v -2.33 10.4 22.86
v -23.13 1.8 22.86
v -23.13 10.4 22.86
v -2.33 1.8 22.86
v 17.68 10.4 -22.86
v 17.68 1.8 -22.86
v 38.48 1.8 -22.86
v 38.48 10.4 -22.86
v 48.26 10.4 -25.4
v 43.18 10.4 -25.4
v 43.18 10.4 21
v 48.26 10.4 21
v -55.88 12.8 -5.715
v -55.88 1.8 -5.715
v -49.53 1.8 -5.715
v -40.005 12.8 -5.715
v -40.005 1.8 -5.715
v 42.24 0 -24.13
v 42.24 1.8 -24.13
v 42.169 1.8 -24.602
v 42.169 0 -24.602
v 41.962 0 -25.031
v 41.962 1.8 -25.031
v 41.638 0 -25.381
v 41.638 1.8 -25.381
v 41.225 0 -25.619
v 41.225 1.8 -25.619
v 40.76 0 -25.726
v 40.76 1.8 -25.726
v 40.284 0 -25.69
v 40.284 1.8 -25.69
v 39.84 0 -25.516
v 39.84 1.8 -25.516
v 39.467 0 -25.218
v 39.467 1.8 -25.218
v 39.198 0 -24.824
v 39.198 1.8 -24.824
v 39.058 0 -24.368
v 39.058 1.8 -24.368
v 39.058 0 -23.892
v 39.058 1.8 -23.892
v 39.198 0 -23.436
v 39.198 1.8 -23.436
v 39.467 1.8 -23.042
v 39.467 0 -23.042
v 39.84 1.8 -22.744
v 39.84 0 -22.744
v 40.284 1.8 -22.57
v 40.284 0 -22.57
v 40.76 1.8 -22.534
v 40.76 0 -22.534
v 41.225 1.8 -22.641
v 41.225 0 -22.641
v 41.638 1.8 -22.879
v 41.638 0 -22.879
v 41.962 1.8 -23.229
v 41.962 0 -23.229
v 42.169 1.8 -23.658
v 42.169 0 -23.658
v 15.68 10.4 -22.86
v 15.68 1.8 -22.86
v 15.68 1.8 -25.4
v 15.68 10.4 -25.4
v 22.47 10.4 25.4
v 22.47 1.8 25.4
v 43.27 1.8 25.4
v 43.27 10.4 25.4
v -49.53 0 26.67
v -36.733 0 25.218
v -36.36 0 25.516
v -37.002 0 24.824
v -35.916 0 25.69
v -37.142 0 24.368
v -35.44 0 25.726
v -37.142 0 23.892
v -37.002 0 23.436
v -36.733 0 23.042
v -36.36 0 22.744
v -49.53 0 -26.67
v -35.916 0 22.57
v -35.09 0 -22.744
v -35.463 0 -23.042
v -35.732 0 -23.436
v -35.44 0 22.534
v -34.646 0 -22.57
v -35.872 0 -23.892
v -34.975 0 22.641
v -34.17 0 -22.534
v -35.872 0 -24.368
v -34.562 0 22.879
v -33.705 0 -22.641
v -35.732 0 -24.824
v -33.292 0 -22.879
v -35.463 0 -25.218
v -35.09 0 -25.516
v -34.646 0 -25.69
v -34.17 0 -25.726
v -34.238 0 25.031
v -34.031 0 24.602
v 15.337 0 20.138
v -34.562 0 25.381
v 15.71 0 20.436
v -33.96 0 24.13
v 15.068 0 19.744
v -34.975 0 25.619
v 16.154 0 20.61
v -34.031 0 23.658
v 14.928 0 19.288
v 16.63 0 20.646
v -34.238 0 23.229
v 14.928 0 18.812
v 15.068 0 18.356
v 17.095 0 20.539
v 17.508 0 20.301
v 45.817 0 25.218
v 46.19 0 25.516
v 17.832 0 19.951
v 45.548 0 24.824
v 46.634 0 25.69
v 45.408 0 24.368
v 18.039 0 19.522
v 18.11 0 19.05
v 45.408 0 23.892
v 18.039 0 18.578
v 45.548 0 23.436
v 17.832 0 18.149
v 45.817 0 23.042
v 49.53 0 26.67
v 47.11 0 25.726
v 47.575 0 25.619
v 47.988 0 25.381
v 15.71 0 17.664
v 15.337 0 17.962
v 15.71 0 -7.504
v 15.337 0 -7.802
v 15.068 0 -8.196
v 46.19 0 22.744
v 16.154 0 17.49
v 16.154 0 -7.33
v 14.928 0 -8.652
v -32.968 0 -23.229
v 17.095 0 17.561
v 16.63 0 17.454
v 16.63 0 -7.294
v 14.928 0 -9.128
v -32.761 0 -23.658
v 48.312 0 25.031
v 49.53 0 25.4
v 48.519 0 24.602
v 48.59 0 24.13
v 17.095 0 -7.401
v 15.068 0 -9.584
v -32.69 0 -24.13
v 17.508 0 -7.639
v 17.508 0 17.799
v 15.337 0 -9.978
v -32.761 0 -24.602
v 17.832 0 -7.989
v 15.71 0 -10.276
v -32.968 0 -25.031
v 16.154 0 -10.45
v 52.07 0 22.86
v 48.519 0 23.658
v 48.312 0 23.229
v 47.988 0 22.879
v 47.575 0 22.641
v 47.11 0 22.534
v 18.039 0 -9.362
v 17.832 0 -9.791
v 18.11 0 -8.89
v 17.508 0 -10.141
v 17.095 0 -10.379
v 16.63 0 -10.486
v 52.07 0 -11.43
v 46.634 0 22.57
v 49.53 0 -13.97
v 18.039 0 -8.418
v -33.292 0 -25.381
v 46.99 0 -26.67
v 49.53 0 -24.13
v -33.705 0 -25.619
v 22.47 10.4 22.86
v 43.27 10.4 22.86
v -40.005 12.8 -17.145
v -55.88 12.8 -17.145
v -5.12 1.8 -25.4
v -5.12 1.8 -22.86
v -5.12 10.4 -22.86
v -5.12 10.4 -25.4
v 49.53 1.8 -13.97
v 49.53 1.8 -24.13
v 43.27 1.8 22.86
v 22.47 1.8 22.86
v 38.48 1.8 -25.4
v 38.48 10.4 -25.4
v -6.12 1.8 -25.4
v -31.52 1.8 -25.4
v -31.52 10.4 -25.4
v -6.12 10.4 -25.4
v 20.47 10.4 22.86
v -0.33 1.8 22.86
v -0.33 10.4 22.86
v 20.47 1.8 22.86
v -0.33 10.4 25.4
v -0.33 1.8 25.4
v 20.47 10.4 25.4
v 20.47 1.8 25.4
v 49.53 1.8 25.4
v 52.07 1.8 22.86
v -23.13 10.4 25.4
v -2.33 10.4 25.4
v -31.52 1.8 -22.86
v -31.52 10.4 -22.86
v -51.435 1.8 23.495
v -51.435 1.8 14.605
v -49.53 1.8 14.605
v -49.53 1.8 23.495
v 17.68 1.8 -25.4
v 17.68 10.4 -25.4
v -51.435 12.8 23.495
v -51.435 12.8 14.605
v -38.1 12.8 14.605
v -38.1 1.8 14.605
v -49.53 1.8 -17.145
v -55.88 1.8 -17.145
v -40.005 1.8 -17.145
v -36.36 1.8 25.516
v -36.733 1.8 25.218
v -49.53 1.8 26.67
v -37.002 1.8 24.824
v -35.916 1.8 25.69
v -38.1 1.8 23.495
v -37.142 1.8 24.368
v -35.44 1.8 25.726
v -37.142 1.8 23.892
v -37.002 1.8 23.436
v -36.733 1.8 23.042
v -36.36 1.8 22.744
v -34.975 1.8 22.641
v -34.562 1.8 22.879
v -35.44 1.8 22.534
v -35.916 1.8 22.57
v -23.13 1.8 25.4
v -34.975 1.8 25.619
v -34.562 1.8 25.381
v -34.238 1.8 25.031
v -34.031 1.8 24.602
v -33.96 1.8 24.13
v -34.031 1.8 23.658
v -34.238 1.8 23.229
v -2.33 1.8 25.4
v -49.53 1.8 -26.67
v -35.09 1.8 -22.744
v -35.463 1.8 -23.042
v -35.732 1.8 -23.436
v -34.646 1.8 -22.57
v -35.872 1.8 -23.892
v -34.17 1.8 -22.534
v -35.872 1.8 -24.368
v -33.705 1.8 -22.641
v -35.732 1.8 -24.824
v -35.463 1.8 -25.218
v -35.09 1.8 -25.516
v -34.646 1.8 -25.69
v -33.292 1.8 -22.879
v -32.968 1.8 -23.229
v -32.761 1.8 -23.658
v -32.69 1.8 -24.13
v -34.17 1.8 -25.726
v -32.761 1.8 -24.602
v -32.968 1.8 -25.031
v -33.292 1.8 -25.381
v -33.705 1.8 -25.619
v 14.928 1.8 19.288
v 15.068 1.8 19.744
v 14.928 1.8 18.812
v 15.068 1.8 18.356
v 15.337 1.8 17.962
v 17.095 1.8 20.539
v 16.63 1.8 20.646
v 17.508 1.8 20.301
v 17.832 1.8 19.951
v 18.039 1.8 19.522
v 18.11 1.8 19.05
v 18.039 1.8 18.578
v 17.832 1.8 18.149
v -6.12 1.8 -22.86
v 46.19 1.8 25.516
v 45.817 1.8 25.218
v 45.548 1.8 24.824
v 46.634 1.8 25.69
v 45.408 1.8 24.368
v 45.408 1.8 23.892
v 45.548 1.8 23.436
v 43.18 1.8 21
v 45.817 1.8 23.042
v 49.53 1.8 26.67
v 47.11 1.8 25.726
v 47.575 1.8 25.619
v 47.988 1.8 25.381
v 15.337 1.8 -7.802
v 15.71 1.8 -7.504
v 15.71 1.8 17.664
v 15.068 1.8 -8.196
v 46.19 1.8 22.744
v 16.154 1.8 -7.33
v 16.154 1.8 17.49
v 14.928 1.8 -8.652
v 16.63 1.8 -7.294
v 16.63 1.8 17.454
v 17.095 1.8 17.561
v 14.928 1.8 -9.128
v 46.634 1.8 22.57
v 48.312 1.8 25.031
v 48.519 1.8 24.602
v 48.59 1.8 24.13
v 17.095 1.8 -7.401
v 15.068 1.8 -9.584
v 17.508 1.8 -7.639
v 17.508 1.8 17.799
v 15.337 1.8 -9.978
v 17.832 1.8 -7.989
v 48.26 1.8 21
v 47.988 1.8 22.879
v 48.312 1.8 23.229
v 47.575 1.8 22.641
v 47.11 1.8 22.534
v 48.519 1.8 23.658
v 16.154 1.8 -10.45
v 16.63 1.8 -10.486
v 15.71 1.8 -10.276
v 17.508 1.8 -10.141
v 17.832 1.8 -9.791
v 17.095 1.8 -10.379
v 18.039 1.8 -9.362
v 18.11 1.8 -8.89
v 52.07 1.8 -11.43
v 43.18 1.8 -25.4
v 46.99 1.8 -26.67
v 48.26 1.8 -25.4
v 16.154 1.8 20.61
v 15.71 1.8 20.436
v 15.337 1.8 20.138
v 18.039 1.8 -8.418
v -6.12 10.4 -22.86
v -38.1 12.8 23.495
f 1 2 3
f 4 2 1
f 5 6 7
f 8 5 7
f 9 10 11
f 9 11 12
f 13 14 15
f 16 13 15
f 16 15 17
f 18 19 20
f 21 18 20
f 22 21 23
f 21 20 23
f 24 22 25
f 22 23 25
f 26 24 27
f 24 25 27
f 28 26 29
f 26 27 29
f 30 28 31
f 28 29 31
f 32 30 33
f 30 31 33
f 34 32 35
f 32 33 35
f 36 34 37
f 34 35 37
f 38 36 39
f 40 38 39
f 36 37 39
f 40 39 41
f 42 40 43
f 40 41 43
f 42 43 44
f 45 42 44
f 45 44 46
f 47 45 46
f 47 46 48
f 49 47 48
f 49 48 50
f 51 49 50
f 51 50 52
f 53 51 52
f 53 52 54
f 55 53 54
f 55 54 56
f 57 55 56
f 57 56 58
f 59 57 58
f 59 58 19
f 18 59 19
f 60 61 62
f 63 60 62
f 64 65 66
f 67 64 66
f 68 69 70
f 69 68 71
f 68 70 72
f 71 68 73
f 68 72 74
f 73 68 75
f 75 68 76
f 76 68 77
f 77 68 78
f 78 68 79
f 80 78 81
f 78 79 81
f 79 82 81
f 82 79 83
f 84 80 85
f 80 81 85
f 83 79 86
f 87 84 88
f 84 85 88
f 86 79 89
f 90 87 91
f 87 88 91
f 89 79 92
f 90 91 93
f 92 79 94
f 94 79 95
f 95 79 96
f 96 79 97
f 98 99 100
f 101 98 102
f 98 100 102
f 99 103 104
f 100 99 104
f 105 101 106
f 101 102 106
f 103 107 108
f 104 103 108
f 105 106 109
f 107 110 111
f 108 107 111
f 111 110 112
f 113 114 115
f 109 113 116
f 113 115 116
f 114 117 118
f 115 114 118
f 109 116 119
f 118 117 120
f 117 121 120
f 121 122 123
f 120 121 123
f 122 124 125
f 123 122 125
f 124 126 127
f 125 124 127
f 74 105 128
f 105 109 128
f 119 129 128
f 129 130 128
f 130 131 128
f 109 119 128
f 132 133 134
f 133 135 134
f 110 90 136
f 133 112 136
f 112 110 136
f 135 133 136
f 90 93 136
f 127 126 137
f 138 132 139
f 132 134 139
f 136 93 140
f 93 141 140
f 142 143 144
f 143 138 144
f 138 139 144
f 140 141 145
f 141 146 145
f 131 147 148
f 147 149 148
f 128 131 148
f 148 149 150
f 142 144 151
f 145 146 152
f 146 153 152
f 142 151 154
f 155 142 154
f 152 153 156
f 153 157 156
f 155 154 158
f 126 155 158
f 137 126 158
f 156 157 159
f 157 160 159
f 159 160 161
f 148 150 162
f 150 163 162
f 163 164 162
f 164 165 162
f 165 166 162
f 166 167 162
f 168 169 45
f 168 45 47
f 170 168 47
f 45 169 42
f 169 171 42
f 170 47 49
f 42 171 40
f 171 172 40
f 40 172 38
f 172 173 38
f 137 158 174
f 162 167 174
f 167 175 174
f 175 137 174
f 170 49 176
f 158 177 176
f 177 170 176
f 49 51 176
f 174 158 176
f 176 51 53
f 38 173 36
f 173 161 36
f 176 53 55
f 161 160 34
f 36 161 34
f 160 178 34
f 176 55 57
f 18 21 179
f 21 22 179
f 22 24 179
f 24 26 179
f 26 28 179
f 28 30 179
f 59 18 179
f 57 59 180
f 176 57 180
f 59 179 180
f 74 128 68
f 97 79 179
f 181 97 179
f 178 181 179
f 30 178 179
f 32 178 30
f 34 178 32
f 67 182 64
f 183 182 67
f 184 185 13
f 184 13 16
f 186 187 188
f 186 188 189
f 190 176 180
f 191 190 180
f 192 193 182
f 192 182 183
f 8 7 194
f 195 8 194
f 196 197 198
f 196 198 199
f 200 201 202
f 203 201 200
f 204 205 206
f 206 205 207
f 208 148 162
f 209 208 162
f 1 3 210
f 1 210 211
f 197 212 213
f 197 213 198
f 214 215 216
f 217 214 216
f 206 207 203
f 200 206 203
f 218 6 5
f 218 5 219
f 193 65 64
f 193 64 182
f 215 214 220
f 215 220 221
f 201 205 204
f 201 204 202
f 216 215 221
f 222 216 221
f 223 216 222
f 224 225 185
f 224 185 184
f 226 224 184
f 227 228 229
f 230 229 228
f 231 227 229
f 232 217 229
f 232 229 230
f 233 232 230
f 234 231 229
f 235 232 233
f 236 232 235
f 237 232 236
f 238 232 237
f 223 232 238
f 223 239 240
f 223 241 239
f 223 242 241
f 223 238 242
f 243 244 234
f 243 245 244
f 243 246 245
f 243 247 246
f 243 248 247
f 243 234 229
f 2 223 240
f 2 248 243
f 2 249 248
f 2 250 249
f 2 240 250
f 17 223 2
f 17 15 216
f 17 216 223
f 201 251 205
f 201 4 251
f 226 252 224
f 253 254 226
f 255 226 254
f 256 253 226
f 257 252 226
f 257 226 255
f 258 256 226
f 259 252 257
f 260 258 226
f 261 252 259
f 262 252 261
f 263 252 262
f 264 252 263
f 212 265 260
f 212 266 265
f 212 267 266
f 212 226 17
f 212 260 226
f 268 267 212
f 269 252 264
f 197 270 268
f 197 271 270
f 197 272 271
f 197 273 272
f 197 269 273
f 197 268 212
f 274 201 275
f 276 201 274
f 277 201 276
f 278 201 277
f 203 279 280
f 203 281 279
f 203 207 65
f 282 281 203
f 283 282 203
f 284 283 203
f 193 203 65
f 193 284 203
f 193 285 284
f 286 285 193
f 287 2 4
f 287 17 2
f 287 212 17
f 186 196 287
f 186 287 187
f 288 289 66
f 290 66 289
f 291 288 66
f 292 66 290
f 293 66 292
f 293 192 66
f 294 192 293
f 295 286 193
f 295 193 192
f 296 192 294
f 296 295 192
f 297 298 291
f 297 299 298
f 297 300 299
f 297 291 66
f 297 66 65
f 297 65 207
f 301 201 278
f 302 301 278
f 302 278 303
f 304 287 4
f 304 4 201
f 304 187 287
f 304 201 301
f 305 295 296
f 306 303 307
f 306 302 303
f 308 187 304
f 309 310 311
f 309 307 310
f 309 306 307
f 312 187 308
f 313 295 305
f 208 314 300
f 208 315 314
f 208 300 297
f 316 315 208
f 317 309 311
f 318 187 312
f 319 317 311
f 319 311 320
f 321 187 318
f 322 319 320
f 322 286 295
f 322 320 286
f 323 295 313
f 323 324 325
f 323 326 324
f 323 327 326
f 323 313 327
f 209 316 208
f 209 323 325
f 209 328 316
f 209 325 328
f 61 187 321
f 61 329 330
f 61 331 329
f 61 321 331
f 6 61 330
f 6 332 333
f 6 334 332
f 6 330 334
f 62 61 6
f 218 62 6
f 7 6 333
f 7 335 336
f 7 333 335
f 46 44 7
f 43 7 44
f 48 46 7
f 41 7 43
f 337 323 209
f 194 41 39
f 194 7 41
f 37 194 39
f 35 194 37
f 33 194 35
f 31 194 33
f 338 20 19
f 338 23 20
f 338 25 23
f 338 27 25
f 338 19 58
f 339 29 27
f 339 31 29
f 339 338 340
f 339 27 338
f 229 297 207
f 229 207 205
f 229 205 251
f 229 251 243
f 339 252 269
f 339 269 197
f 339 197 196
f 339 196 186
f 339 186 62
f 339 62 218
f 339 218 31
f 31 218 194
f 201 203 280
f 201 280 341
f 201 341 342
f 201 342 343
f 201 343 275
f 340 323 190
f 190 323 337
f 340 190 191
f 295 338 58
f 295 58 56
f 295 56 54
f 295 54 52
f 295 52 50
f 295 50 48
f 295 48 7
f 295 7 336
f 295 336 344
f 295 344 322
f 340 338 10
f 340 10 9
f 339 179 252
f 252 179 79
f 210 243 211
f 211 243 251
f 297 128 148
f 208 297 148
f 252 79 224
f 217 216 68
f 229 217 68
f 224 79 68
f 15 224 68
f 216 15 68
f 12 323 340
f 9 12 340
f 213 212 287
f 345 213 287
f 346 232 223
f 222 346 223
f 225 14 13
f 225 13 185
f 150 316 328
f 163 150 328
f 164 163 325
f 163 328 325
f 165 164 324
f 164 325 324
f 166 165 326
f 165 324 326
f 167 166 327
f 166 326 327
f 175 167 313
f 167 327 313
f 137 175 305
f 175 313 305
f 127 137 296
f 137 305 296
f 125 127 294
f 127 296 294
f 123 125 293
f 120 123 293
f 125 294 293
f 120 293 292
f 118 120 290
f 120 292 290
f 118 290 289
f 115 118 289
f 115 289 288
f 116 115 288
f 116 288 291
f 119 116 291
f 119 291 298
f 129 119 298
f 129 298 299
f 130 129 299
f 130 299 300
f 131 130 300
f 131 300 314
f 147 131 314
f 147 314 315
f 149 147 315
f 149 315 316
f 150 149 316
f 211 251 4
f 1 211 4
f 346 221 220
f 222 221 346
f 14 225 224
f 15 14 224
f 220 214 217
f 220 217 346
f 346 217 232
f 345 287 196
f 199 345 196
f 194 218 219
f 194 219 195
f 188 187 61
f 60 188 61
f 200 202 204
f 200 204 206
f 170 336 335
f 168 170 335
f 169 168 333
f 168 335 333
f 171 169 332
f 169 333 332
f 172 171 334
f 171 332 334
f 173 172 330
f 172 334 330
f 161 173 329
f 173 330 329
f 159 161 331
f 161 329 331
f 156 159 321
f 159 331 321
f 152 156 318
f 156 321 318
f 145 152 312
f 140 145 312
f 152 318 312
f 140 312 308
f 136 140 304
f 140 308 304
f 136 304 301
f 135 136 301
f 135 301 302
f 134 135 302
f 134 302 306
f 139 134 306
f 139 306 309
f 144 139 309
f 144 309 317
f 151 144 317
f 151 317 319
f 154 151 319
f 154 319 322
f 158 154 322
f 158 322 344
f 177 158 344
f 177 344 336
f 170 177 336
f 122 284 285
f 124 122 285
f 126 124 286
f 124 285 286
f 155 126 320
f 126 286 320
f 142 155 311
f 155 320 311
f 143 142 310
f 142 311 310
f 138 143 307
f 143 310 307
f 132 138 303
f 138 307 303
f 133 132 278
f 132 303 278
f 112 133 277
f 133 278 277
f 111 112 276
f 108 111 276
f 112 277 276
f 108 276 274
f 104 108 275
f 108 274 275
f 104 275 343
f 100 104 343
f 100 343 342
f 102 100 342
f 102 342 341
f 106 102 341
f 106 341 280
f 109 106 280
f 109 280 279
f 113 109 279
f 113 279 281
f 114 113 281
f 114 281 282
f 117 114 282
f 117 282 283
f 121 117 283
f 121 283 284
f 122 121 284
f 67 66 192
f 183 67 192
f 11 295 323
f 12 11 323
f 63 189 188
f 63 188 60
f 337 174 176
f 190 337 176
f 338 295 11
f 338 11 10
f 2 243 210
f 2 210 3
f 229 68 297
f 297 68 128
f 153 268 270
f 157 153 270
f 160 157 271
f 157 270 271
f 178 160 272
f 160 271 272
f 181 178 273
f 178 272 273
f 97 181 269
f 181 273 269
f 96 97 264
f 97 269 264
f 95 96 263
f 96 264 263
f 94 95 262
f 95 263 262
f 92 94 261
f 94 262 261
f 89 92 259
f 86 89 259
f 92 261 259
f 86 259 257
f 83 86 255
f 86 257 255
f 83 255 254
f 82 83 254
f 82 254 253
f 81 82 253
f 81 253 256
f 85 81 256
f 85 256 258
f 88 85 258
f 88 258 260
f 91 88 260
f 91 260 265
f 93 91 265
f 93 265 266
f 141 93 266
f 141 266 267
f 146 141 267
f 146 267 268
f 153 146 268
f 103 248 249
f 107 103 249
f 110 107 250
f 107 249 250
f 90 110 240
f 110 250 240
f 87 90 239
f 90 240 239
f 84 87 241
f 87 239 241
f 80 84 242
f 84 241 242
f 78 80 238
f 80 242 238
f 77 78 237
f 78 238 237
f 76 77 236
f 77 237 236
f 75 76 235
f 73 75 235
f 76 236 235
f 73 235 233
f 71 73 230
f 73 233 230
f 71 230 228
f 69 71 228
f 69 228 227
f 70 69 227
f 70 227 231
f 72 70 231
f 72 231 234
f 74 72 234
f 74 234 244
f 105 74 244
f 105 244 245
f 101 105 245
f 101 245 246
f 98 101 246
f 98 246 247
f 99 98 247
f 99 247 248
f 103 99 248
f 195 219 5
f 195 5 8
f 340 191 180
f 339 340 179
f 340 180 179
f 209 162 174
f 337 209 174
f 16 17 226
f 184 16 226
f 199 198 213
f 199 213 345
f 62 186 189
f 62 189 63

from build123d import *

# Parameters (mm, degrees)
BOSS_EXTRUDE1_DEPTH = 1.8
CUT_EXTRUDE1_REACH  = 3.8
SKETCH2_R           = 1.6
SKETCH3_W           = 15.875
SKETCH3_H           = 11.43
BOSS_EXTRUDE2_DEPTH = 11
SKETCH4_W           = 13.335
SKETCH4_H           = 8.89
BOSS_EXTRUDE3_DEPTH = 11
SKETCH5_W           = 20.8
SKETCH5_H           = 2.54
SKETCH5_W_2         = 5.08
SKETCH5_H_2         = 46.4
SKETCH5_W_3         = 25.4
BOSS_EXTRUDE4_DEPTH = 8.6


with BuildPart() as part:
    # Sketch1 → Boss-Extrude1 (new body)
    with BuildSketch(Plane(origin=(0, 0, 0), x_dir=(1, 0, 0), z_dir=(0, 1, 0))):
        Polygon((-49.53, -26.67), (49.53, -26.67), (49.53, -25.4), (52.07, -22.86), (52.07, 11.43), (49.53, 13.97), (49.53, 24.13), (46.99, 26.67), (-49.53, 26.67), align=None)
    extrude(amount=BOSS_EXTRUDE1_DEPTH)

    # Sketch2 → Cut-Extrude1 (cut, up to next)
    with BuildSketch(Plane(origin=(0, 1.8, 0), x_dir=(1, 0, 0), z_dir=(0, 1, 0)), mode=Mode.PRIVATE) as cut_extrude1_sk1:
        with Locations((-35.56, -24.13)):
            Circle(SKETCH2_R)
    cut_extrude1_tool1 = extrude(cut_extrude1_sk1.sketch, amount=-CUT_EXTRUDE1_REACH, mode=Mode.PRIVATE) & part.part
    add(cut_extrude1_tool1.solids().sort_by_distance((-35.56, 1.8, 24.13))[0], mode=Mode.SUBTRACT)
    # Sketch2 → Cut-Extrude1 (cut, up to next)
    with BuildSketch(Plane(origin=(0, 1.8, 0), x_dir=(1, 0, 0), z_dir=(0, 1, 0)), mode=Mode.PRIVATE) as cut_extrude1_sk2:
        with Locations((16.51, -19.05)):
            Circle(SKETCH2_R)
    cut_extrude1_tool2 = extrude(cut_extrude1_sk2.sketch, amount=-CUT_EXTRUDE1_REACH, mode=Mode.PRIVATE) & part.part
    add(cut_extrude1_tool2.solids().sort_by_distance((16.51, 1.8, 19.05))[0], mode=Mode.SUBTRACT)
    # Sketch2 → Cut-Extrude1 (cut, up to next)
    with BuildSketch(Plane(origin=(0, 1.8, 0), x_dir=(1, 0, 0), z_dir=(0, 1, 0)), mode=Mode.PRIVATE) as cut_extrude1_sk3:
        with Locations((16.51, 8.89)):
            Circle(SKETCH2_R)
    cut_extrude1_tool3 = extrude(cut_extrude1_sk3.sketch, amount=-CUT_EXTRUDE1_REACH, mode=Mode.PRIVATE) & part.part
    add(cut_extrude1_tool3.solids().sort_by_distance((16.51, 1.8, -8.89))[0], mode=Mode.SUBTRACT)
    # Sketch2 → Cut-Extrude1 (cut, up to next)
    with BuildSketch(Plane(origin=(0, 1.8, 0), x_dir=(1, 0, 0), z_dir=(0, 1, 0)), mode=Mode.PRIVATE) as cut_extrude1_sk4:
        with Locations((46.99, -24.13)):
            Circle(SKETCH2_R)
    cut_extrude1_tool4 = extrude(cut_extrude1_sk4.sketch, amount=-CUT_EXTRUDE1_REACH, mode=Mode.PRIVATE) & part.part
    add(cut_extrude1_tool4.solids().sort_by_distance((46.99, 1.8, 24.13))[0], mode=Mode.SUBTRACT)
    # Sketch2 → Cut-Extrude1 (cut, up to next)
    with BuildSketch(Plane(origin=(0, 1.8, 0), x_dir=(1, 0, 0), z_dir=(0, 1, 0)), mode=Mode.PRIVATE) as cut_extrude1_sk5:
        with Locations((40.64, 24.13)):
            Circle(SKETCH2_R)
    cut_extrude1_tool5 = extrude(cut_extrude1_sk5.sketch, amount=-CUT_EXTRUDE1_REACH, mode=Mode.PRIVATE) & part.part
    add(cut_extrude1_tool5.solids().sort_by_distance((40.64, 1.8, -24.13))[0], mode=Mode.SUBTRACT)
    # Sketch2 → Cut-Extrude1 (cut, up to next)
    with BuildSketch(Plane(origin=(0, 1.8, 0), x_dir=(1, 0, 0), z_dir=(0, 1, 0)), mode=Mode.PRIVATE) as cut_extrude1_sk6:
        with Locations((-34.29, 24.13)):
            Circle(SKETCH2_R)
    cut_extrude1_tool6 = extrude(cut_extrude1_sk6.sketch, amount=-CUT_EXTRUDE1_REACH, mode=Mode.PRIVATE) & part.part
    add(cut_extrude1_tool6.solids().sort_by_distance((-34.29, 1.8, -24.13))[0], mode=Mode.SUBTRACT)

    # Sketch3 → Boss-Extrude2 (add)
    with BuildSketch(Plane(origin=(0, 1.8, 0), x_dir=(1, 0, 0), z_dir=(0, 1, 0))):
        with Locations((-47.9425, 11.43)):
            Rectangle(SKETCH3_W, SKETCH3_H)
    extrude(amount=BOSS_EXTRUDE2_DEPTH)

    # Sketch4 → Boss-Extrude3 (add)
    with BuildSketch(Plane(origin=(0, 1.8, 0), x_dir=(1, 0, 0), z_dir=(0, 1, 0))):
        with Locations((-44.7675, -19.05)):
            Rectangle(SKETCH4_W, SKETCH4_H)
    extrude(amount=BOSS_EXTRUDE3_DEPTH)

    # Sketch5 → Boss-Extrude4 (add)
    with BuildSketch(Plane(origin=(0, 1.8, 0), x_dir=(1, 0, 0), z_dir=(0, 1, 0))):
        with Locations((-12.73, -24.13)):
            Rectangle(SKETCH5_W, SKETCH5_H)
        with Locations((10.07, -24.13)):
            Rectangle(SKETCH5_W, SKETCH5_H)
        with Locations((32.87, -24.13)):
            Rectangle(SKETCH5_W, SKETCH5_H)
        with Locations((45.72, 2.2)):
            Rectangle(SKETCH5_W_2, SKETCH5_H_2)
        with Locations((28.08, 24.13)):
            Rectangle(SKETCH5_W, SKETCH5_H)
        with Locations((5.28, 24.13)):
            Rectangle(SKETCH5_W, SKETCH5_H)
        with Locations((-18.82, 24.13)):
            Rectangle(SKETCH5_W_3, SKETCH5_H)
    extrude(amount=BOSS_EXTRUDE4_DEPTH)


solid = part.part
